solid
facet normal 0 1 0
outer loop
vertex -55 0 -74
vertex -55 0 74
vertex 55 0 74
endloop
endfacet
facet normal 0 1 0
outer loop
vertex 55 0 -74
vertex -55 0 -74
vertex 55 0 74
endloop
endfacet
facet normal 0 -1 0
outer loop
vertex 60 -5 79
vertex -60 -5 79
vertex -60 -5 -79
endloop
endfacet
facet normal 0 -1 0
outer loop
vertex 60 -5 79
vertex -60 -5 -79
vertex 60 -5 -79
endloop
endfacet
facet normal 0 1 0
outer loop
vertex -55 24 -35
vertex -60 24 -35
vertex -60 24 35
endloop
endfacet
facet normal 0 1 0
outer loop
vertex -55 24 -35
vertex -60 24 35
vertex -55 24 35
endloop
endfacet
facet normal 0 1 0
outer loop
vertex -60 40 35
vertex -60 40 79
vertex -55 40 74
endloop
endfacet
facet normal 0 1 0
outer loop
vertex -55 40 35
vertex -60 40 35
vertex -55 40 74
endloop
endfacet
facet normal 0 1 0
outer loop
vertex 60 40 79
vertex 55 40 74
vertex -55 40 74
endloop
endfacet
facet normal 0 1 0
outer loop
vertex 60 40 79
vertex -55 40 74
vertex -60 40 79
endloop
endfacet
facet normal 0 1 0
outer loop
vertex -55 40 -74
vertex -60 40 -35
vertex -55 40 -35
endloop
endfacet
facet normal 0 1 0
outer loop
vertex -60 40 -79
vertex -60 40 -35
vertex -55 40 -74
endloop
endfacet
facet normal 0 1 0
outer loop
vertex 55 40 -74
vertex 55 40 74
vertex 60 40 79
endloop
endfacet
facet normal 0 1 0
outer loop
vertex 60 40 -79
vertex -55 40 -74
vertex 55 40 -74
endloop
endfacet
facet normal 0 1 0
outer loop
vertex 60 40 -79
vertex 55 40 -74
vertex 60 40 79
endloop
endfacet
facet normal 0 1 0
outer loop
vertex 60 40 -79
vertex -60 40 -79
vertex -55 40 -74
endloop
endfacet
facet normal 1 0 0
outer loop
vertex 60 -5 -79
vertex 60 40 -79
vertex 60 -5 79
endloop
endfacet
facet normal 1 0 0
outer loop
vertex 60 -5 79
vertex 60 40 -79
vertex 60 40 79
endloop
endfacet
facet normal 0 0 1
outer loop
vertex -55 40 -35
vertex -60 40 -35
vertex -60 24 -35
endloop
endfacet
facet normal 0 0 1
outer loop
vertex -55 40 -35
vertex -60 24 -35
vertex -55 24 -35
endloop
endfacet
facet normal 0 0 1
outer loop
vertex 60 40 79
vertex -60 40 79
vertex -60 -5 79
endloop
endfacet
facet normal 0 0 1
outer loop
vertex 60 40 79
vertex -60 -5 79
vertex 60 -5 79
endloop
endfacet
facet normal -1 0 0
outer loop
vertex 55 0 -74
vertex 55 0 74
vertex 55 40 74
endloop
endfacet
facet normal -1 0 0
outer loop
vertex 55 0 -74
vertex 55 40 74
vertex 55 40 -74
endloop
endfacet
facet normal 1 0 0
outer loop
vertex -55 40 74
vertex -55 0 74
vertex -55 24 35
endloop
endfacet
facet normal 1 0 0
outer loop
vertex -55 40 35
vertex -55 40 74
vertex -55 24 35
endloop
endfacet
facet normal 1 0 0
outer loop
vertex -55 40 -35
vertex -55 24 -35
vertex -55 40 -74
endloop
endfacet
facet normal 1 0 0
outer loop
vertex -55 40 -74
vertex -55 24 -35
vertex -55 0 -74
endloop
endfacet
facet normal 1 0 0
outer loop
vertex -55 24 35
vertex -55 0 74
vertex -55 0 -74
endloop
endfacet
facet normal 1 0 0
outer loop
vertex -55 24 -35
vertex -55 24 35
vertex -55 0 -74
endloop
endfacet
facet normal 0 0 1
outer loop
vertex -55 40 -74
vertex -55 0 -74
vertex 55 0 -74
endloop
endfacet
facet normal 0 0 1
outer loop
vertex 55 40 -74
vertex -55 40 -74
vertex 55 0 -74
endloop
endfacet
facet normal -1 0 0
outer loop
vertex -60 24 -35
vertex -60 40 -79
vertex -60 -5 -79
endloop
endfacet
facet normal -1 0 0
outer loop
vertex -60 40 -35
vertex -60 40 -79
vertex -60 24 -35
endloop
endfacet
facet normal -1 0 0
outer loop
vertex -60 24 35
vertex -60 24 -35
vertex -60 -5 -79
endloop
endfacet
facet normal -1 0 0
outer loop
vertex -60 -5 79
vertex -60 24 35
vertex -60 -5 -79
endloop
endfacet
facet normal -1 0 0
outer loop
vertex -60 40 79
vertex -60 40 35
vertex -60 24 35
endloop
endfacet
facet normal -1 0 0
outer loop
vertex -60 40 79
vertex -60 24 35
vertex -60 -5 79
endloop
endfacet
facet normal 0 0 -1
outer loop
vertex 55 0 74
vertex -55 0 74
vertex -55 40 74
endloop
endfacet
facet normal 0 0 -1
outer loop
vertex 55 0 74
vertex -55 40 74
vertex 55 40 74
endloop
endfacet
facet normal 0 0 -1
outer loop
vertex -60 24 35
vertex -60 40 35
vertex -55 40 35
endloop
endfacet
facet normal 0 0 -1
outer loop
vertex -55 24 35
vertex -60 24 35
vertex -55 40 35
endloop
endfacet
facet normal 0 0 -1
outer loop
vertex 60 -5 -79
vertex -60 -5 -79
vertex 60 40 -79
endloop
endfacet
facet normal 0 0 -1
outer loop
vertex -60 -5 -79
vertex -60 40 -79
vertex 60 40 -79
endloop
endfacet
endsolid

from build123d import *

# Parameters (mm, degrees)
SKETCH1_W           = 120
SKETCH1_H           = 158
SKETCH1_W_2         = 110
SKETCH1_H_2         = 148
BOSS_EXTRUDE1_DEPTH = 40
SKETCH2_W           = 120
SKETCH2_H           = 158
BOSS_EXTRUDE2_DEPTH = 5
SKETCH3_W           = 5
SKETCH3_H           = 70
CUT_EXTRUDE1_DEPTH  = 16


with BuildPart() as part:
    # Sketch1 → Boss-Extrude1 (new body)
    with BuildSketch(Plane(origin=(0, 0, 0), x_dir=(1, 0, 0), z_dir=(0, 1, 0))):
        Rectangle(SKETCH1_W, SKETCH1_H)
        Rectangle(SKETCH1_W_2, SKETCH1_H_2, mode=Mode.SUBTRACT)
    extrude(amount=BOSS_EXTRUDE1_DEPTH)

    # Sketch2 → Boss-Extrude2 (add)
    with BuildSketch(Plane.XZ):
        Rectangle(SKETCH2_W, SKETCH2_H)
    extrude(amount=BOSS_EXTRUDE2_DEPTH)

    # Sketch3 → Cut-Extrude1 (cut)
    with BuildSketch(Plane(origin=(0, 40, 0), x_dir=(1, 0, 0), z_dir=(0, 1, 0))):
        with Locations((-57.5, 0)):
            Rectangle(SKETCH3_W, SKETCH3_H)
    extrude(amount=-CUT_EXTRUDE1_DEPTH, mode=Mode.SUBTRACT)


solid = part.part
